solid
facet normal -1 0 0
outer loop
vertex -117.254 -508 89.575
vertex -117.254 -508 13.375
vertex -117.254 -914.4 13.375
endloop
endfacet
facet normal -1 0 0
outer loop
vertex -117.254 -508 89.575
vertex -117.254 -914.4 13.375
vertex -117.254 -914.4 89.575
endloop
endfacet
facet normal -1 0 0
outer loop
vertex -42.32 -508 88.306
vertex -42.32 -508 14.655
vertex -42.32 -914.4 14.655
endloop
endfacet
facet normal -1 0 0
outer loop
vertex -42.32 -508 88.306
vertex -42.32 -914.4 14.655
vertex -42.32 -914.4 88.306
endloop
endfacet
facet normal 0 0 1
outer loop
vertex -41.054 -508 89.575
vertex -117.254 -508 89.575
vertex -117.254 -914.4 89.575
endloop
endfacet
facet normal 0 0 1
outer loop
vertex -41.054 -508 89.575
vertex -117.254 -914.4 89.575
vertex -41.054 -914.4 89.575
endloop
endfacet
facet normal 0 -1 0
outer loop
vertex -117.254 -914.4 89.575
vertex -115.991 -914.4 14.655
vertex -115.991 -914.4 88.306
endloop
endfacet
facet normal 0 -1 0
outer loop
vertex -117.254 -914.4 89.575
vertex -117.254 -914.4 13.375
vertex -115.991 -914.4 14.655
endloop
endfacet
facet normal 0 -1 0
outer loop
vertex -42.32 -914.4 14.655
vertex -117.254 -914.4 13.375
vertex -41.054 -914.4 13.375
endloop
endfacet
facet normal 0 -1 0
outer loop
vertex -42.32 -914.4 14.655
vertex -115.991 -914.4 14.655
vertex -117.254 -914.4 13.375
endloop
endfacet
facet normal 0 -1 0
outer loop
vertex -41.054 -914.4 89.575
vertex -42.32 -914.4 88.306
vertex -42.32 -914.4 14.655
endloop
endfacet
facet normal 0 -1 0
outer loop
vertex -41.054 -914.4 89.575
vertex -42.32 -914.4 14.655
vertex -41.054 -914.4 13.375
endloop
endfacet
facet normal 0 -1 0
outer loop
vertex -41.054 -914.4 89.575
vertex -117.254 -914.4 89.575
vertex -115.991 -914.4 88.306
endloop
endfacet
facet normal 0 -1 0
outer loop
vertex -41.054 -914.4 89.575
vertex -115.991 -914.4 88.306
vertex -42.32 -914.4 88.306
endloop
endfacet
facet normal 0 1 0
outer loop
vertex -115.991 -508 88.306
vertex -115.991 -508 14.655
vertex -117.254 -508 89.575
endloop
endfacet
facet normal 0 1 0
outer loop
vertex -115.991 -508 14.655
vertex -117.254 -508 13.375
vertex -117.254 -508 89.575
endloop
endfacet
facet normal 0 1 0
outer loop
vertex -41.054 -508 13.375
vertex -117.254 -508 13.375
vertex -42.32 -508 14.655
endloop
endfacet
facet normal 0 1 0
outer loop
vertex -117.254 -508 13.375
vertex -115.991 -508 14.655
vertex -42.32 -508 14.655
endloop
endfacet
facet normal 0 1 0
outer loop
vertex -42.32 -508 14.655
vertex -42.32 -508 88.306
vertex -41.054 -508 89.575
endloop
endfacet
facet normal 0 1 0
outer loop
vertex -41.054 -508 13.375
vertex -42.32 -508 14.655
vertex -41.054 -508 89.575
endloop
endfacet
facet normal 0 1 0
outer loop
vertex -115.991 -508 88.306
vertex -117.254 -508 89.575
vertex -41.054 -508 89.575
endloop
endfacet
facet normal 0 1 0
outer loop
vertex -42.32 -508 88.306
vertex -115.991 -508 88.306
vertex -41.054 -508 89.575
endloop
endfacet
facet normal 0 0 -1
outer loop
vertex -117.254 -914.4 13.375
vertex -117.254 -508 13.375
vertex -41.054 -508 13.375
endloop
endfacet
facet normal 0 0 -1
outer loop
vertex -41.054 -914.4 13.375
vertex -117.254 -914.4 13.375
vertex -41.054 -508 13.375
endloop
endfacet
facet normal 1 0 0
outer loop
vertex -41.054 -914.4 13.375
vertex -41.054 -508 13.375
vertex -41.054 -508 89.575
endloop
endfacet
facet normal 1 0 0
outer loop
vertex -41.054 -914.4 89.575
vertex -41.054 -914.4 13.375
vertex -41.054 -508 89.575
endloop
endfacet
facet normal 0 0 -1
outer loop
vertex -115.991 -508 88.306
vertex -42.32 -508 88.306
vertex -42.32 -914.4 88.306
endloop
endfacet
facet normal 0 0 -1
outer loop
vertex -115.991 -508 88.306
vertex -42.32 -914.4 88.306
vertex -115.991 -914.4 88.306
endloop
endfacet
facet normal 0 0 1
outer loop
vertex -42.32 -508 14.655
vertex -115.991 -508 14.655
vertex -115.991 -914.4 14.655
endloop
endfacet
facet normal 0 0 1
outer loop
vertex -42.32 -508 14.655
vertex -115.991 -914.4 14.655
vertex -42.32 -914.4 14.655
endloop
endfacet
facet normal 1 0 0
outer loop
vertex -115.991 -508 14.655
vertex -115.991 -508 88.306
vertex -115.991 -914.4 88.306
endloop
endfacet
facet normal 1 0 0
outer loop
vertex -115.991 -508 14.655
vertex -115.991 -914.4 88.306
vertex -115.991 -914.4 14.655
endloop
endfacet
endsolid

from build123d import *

# Parameters (mm, degrees)
F0_W     = 76.2
F0_H     = 76.2
F1_DEPTH = 609.6
F3_DEPTH = 914.4
F4_DEPTH = 304.8
F5_DEPTH = 508


with BuildPart() as f1:
    # F0 (on Front) → F1 (new body)
    with BuildSketch(Plane.XZ):
        with Locations((-79.1539917648, 51.4746750653)):
            Rectangle(F0_W, F0_H)
    extrude(amount=F1_DEPTH)

    # F2 (on face) → F3 (cut)
    with BuildSketch(Plane.XZ.offset(609.6)):
        Polygon((-42.3204526305, 88.3055701852), (-98.6881405115, 88.3055701852), (-115.9909814596, 88.3055701852), (-115.9909814596, 14.655277133), (-42.3204526305, 14.655277133), align=None)
    extrude(amount=-F3_DEPTH, mode=Mode.SUBTRACT)

    # F4 (add): a face of the model
    f4_faces = [f1.faces().sort_by_distance(p)[0] for p in [
        (-42.1316224993, -609.6, 51.4746750653),
    ]]
    extrude(f4_faces, amount=F4_DEPTH)

    # F5 (cut): a face of the model
    f5_faces = [f1.faces().sort_by_distance(p)[0] for p in [
        (-42.1316224993, 0, 51.4746750653),
    ]]
    extrude(f5_faces, amount=-F5_DEPTH, mode=Mode.SUBTRACT)


solid = f1.part
